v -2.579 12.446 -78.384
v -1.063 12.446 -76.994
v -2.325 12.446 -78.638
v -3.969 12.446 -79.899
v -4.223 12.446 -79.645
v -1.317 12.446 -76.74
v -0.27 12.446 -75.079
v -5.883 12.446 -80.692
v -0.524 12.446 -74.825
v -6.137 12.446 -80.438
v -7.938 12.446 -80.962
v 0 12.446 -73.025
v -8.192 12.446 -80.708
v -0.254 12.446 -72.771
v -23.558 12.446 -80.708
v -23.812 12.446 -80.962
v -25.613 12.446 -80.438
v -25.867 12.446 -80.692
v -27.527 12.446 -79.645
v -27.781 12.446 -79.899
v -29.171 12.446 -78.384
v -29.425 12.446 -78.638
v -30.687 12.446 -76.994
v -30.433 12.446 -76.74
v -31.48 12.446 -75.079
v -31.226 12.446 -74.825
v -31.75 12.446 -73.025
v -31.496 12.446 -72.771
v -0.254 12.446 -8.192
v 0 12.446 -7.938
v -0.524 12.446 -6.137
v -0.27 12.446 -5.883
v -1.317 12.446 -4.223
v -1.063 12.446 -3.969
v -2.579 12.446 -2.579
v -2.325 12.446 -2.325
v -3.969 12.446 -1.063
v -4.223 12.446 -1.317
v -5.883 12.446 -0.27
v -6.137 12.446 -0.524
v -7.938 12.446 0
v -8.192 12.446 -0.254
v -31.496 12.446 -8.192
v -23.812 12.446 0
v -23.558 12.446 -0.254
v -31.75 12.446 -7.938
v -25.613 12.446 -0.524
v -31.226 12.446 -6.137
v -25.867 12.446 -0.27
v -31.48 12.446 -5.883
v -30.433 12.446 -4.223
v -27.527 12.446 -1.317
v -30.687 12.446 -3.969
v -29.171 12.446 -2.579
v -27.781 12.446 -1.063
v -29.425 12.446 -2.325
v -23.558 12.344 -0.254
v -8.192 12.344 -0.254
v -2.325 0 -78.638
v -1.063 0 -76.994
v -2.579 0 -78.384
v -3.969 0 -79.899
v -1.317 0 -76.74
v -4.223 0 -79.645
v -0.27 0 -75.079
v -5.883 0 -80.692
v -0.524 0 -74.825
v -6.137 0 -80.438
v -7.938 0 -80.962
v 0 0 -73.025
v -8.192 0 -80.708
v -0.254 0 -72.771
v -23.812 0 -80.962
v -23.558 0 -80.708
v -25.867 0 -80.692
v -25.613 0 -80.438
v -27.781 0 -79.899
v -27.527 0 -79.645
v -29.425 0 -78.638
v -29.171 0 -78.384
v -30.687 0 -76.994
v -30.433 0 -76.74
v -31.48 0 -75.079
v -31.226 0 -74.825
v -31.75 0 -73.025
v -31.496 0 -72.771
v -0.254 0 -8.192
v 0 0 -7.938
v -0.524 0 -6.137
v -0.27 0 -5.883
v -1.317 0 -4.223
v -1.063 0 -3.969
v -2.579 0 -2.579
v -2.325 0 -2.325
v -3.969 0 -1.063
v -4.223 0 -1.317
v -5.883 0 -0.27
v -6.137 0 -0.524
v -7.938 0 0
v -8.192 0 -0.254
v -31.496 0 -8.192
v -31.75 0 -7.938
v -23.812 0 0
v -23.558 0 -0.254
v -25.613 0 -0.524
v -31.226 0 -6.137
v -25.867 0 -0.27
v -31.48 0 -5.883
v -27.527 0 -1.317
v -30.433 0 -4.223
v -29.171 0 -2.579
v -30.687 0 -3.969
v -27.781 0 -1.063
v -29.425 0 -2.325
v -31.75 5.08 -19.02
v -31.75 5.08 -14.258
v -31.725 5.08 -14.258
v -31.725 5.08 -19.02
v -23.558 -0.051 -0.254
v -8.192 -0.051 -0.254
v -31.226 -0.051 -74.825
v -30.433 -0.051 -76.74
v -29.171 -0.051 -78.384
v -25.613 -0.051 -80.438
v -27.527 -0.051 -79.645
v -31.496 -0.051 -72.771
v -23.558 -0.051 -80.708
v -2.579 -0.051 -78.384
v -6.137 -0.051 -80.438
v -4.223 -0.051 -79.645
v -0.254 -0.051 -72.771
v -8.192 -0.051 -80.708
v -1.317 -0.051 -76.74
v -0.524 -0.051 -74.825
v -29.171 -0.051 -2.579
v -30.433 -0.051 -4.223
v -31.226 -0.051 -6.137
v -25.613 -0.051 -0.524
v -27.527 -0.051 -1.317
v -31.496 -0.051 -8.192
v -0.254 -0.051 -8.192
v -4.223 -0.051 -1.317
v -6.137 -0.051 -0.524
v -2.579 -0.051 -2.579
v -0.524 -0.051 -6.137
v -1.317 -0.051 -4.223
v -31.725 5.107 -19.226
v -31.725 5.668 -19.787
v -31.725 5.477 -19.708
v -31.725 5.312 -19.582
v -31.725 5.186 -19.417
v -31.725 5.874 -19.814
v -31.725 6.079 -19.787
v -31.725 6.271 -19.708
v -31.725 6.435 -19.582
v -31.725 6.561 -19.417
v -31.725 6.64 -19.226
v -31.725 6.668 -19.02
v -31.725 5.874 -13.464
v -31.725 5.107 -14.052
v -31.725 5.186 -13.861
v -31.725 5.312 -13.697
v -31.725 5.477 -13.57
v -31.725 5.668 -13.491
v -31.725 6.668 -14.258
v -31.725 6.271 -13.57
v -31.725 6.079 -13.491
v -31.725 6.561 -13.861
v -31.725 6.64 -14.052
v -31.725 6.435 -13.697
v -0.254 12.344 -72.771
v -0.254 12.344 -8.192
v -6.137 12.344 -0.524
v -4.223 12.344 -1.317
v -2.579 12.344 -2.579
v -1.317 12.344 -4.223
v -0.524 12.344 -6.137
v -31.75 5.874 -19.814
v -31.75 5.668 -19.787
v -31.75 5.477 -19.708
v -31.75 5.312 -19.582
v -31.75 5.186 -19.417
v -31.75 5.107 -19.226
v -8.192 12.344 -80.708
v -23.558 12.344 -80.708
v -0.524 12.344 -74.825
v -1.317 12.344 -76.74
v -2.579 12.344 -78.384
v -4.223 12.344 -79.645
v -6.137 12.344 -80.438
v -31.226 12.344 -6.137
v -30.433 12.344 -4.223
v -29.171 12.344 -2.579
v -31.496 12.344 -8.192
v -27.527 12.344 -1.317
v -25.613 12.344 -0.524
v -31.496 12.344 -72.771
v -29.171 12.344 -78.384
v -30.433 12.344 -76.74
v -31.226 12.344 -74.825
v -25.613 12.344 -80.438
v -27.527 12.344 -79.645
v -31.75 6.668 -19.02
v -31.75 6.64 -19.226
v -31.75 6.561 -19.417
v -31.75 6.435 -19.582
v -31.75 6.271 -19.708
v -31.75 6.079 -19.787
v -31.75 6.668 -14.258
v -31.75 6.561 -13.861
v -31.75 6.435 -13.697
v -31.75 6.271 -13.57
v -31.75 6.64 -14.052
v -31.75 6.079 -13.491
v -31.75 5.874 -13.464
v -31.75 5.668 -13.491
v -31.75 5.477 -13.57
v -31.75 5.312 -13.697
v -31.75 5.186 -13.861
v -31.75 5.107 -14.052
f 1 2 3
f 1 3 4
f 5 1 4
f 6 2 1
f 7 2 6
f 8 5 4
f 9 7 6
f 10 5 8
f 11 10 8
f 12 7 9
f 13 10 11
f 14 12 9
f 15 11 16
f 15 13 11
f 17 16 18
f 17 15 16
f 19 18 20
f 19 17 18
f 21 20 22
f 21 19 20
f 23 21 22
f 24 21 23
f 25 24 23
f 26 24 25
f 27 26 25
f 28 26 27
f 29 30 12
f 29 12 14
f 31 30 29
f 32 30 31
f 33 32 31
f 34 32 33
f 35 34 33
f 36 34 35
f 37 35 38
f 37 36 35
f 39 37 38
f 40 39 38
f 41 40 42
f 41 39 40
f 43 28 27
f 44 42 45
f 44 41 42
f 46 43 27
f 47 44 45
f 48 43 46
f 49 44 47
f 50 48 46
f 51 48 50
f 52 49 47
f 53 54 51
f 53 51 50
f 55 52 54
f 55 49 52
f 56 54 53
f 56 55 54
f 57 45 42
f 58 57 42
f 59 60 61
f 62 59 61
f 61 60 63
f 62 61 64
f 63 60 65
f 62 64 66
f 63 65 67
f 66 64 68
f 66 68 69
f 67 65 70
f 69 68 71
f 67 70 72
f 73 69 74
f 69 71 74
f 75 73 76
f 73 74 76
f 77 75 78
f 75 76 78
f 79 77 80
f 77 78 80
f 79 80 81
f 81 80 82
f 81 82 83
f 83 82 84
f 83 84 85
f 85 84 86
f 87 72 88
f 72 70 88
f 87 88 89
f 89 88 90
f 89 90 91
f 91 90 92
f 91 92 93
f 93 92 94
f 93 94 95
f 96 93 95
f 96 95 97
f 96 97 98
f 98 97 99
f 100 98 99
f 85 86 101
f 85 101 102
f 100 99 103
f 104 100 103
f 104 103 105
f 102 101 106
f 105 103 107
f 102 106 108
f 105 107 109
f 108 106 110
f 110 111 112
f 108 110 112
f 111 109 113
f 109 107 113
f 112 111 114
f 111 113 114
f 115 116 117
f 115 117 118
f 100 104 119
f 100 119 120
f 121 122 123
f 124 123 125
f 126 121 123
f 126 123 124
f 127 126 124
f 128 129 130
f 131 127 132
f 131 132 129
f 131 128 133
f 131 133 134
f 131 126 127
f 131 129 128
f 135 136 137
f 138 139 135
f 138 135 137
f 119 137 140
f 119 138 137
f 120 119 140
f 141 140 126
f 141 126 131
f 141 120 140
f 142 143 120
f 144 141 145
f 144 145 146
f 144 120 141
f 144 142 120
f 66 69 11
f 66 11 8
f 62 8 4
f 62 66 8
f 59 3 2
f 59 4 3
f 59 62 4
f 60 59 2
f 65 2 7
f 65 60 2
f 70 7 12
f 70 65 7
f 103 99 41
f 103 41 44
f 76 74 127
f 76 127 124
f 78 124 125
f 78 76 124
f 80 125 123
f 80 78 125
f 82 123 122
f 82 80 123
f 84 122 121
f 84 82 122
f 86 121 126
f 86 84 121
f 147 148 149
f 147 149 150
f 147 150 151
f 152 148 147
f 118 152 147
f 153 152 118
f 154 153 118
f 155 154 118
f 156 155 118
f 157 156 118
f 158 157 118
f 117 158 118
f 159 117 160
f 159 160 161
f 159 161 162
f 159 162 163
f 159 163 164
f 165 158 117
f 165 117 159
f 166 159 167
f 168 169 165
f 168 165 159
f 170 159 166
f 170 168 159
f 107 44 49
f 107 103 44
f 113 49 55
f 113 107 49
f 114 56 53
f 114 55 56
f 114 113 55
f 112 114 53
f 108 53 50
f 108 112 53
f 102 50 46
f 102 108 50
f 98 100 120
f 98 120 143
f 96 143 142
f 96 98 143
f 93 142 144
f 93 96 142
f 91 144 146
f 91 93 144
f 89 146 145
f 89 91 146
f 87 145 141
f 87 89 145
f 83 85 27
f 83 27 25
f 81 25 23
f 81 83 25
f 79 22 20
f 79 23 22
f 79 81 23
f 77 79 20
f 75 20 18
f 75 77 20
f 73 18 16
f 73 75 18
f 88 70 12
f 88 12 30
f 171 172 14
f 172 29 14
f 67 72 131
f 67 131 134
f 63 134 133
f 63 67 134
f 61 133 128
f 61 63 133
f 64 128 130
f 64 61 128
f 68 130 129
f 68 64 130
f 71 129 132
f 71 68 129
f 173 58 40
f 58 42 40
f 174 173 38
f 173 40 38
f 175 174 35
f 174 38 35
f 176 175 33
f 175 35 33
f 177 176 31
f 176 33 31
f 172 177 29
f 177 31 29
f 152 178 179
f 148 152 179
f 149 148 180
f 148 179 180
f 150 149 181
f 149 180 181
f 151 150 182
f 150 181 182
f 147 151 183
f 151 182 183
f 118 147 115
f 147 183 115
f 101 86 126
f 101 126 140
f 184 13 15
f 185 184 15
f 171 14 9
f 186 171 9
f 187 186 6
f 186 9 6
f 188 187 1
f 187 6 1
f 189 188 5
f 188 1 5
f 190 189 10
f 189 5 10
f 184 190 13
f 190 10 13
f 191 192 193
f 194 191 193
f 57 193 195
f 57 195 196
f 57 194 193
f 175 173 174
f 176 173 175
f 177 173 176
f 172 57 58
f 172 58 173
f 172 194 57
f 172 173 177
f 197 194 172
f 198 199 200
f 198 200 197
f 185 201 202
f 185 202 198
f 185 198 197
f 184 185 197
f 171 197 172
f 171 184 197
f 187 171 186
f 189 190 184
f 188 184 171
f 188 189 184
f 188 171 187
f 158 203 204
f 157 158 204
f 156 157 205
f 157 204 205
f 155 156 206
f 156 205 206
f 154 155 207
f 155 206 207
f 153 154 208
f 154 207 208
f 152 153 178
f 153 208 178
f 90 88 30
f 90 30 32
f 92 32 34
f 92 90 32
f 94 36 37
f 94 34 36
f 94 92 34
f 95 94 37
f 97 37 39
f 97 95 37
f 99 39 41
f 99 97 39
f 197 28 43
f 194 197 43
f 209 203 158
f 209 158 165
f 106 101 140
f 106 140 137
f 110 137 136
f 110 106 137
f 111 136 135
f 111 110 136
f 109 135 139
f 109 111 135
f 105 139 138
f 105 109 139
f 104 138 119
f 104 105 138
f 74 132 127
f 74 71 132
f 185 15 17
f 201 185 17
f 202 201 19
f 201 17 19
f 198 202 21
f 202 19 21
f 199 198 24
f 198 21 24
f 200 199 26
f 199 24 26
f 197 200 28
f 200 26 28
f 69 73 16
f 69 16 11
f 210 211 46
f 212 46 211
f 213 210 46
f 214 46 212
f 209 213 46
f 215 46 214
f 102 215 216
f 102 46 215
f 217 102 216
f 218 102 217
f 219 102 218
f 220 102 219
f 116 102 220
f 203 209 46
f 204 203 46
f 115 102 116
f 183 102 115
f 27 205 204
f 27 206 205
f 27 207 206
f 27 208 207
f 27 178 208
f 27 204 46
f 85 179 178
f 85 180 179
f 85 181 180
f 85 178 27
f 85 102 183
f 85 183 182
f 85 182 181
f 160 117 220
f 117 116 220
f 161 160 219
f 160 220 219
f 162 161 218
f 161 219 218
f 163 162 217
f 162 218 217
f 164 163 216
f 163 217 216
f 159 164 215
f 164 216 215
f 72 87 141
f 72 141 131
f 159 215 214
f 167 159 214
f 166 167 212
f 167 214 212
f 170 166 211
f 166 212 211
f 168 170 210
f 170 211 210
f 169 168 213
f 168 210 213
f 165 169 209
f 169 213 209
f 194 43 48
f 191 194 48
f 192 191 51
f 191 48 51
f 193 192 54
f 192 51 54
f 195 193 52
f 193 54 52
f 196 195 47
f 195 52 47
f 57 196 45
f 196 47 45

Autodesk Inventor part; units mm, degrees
ref_plane "YZ Plane" through (0, 0, 0) normal (1, 0, 0) x (0, 1, 0)
ref_plane "XZ Plane" through (0, 0, 0) normal (0, 1, 0) x (-1, 0, 0)
ref_plane "XY Plane" through (0, 0, 0) normal (0, 0, 1) x (1, 0, 0)
sketch "Sketch1" plane through (0, 0, 0) normal (0, 1, 0) x (-1, 0, 0)
  line L0 (7.9375, 0) -> (23.8125, 0)
  line L1 (31.75, -7.9375) -> (31.75, -73.025)
  line L2 (23.8125, -80.9625) -> (7.9375, -80.9625)
  line L3 (0, -73.025) -> (0, -7.9375)
  arc A0 (31.75, -7.9375) -> (23.8125, 0) centre (23.8125, -7.9375) ccw
  arc A1 (23.8125, -80.9625) -> (31.75, -73.025) centre (23.8125, -73.025) ccw
  arc A2 (0, -73.025) -> (7.9375, -80.9625) centre (7.9375, -73.025) ccw
  arc A3 (7.9375, 0) -> (0, -7.9375) centre (7.9375, -7.9375) ccw
  point P0 (0, 0)
  point P1 (31.75, -80.9625)
  point P2 (31.75, 0)
  point P3 (0, -80.9625)
  dimension "d0" = 80.9625
  dimension "d1" = 31.75
  dimension "d2" = 7.9375
  dimension "d3" = 7.9375
  dimension "d4" = 7.9375
  dimension "d5" = 7.9375
extrude "Extrusion1" add sketch "Sketch1" along normal blind 12.446
sketch "Sketch2" plane through (0, 12.446, 0) normal (0, 1, 0) x (1, 0, 0)
  line L0 (-31.75, 73.025) -> (-31.75, 7.9375) projected
  line L1 (-31.75, 3.952) -> (-31.496, 3.952)
  line L2 (-23.8125, 0) -> (-7.9375, 0) projected
  line L3 (-15.875, 0) -> (-15.875, 0.254)
  line L4 (-7.9375, 80.9625) -> (-23.8125, 80.9625) projected
  line L5 (-15.875, 80.9625) -> (-15.875, 80.7085)
  line L6 (0, 7.9375) -> (0, 73.025) projected
  line L7 (0, 40.4812) -> (-0.254, 40.4812)
  line L8 (-23.5585, 0.254) -> (-8.1915, 0.254)
  line L9 (-0.254, 8.1915) -> (-0.254, 72.771)
  line L10 (-8.1915, 80.7085) -> (-23.5585, 80.7085)
  line L11 (-31.496, 72.771) -> (-31.496, 8.1915)
  arc A0 (-0.254, 72.771) -> (-8.1915, 80.7085) centre (-8.1915, 72.771) ccw
  arc A1 (-23.5585, 80.7085) -> (-31.496, 72.771) centre (-23.5585, 72.771) ccw
  arc A2 (-8.1915, 0.254) -> (-0.254, 8.1915) centre (-8.1915, 8.1915) ccw
  arc A3 (-31.496, 8.1915) -> (-23.5585, 0.254) centre (-23.5585, 8.1915) ccw
  point P0 (0, 0)
  dimension "d8" = 0.254
  dimension "d9" = 0.254
  dimension "d10" = 0.254
  dimension "d11" = 0.254
  dimension "d12" = 7.9375
extrude "Extrusion2" cut sketch "Sketch2" against normal blind 0.1016
sketch "Sketch3" plane through (-31.75, 0, -73.025) normal (-1, 0, 0) x (0, 0, 1)
  line L0 (65.0875, 0) -> (0, 0) projected
  line L1 (59.5609, 0) -> (59.5609, 5.08)
  line L2 (65.0875, 12.446) -> (65.0875, 6.604)
  line L3 (65.0875, 0) -> (65.0875, 12.446) projected
  line L4 (58.7672, 5.08) -> (54.0047, 5.08)
  line L5 (53.2109, 5.8737) -> (53.2109, 5.8737)
  line L6 (54.0047, 6.6675) -> (58.7672, 6.6675)
  line L7 (59.5609, 5.8737) -> (59.5609, 5.8737)
  arc A0 (54.0047, 6.6675) -> (53.2109, 5.8737) centre (54.0047, 5.8738) ccw
  arc A1 (53.2109, 5.8737) -> (54.0047, 5.08) centre (54.0047, 5.8737) ccw
  arc A2 (59.5609, 5.8737) -> (58.7672, 6.6675) centre (58.7672, 5.8738) ccw
  arc A3 (58.7672, 5.08) -> (59.5609, 5.8737) centre (58.7672, 5.8737) ccw
  point P0 (73.025, 0)
  point P1 (53.2109, 6.6675)
  point P2 (59.5609, 6.6675)
  dimension "d15" = 5.08
  dimension "d17" = 5.842
  dimension "d18" = 6.35
  dimension "d19" = 1.5875
  dimension "d20" = 0.7937
extrude "Extrusion3" cut sketch "Sketch3" against normal blind 0.0254
sketch "Sketch4" plane through (0, 0, 0) normal (0, -1, 0) x (1, 0, 0)
  line L0 (-23.5585, -0.254) -> (-8.1915, -0.254)
  line L1 (-0.254, -8.1915) -> (-0.254, -72.771)
  line L2 (-8.1915, -80.7085) -> (-23.5585, -80.7085)
  line L3 (-31.496, -72.771) -> (-31.496, -8.1915)
  arc A0 (-31.496, -72.771) -> (-23.5585, -80.7085) centre (-23.5585, -72.771) ccw
  arc A1 (-8.1915, -80.7085) -> (-0.254, -72.771) centre (-8.1915, -72.771) ccw
  arc A2 (-23.5585, -0.254) -> (-31.496, -8.1915) centre (-23.5585, -8.1915) ccw
  arc A3 (-0.254, -8.1915) -> (-8.1915, -0.254) centre (-8.1915, -8.1915) ccw
  point P0 (0, 0)
  dimension "d23" = 7.9375
  dimension "d24" = 7.9375
  dimension "d25" = 7.9375
  dimension "d26" = 7.9375
extrude "Extrusion4" add sketch "Sketch4" along normal blind 0.0508
properties part number "leapmotioncontroller"
